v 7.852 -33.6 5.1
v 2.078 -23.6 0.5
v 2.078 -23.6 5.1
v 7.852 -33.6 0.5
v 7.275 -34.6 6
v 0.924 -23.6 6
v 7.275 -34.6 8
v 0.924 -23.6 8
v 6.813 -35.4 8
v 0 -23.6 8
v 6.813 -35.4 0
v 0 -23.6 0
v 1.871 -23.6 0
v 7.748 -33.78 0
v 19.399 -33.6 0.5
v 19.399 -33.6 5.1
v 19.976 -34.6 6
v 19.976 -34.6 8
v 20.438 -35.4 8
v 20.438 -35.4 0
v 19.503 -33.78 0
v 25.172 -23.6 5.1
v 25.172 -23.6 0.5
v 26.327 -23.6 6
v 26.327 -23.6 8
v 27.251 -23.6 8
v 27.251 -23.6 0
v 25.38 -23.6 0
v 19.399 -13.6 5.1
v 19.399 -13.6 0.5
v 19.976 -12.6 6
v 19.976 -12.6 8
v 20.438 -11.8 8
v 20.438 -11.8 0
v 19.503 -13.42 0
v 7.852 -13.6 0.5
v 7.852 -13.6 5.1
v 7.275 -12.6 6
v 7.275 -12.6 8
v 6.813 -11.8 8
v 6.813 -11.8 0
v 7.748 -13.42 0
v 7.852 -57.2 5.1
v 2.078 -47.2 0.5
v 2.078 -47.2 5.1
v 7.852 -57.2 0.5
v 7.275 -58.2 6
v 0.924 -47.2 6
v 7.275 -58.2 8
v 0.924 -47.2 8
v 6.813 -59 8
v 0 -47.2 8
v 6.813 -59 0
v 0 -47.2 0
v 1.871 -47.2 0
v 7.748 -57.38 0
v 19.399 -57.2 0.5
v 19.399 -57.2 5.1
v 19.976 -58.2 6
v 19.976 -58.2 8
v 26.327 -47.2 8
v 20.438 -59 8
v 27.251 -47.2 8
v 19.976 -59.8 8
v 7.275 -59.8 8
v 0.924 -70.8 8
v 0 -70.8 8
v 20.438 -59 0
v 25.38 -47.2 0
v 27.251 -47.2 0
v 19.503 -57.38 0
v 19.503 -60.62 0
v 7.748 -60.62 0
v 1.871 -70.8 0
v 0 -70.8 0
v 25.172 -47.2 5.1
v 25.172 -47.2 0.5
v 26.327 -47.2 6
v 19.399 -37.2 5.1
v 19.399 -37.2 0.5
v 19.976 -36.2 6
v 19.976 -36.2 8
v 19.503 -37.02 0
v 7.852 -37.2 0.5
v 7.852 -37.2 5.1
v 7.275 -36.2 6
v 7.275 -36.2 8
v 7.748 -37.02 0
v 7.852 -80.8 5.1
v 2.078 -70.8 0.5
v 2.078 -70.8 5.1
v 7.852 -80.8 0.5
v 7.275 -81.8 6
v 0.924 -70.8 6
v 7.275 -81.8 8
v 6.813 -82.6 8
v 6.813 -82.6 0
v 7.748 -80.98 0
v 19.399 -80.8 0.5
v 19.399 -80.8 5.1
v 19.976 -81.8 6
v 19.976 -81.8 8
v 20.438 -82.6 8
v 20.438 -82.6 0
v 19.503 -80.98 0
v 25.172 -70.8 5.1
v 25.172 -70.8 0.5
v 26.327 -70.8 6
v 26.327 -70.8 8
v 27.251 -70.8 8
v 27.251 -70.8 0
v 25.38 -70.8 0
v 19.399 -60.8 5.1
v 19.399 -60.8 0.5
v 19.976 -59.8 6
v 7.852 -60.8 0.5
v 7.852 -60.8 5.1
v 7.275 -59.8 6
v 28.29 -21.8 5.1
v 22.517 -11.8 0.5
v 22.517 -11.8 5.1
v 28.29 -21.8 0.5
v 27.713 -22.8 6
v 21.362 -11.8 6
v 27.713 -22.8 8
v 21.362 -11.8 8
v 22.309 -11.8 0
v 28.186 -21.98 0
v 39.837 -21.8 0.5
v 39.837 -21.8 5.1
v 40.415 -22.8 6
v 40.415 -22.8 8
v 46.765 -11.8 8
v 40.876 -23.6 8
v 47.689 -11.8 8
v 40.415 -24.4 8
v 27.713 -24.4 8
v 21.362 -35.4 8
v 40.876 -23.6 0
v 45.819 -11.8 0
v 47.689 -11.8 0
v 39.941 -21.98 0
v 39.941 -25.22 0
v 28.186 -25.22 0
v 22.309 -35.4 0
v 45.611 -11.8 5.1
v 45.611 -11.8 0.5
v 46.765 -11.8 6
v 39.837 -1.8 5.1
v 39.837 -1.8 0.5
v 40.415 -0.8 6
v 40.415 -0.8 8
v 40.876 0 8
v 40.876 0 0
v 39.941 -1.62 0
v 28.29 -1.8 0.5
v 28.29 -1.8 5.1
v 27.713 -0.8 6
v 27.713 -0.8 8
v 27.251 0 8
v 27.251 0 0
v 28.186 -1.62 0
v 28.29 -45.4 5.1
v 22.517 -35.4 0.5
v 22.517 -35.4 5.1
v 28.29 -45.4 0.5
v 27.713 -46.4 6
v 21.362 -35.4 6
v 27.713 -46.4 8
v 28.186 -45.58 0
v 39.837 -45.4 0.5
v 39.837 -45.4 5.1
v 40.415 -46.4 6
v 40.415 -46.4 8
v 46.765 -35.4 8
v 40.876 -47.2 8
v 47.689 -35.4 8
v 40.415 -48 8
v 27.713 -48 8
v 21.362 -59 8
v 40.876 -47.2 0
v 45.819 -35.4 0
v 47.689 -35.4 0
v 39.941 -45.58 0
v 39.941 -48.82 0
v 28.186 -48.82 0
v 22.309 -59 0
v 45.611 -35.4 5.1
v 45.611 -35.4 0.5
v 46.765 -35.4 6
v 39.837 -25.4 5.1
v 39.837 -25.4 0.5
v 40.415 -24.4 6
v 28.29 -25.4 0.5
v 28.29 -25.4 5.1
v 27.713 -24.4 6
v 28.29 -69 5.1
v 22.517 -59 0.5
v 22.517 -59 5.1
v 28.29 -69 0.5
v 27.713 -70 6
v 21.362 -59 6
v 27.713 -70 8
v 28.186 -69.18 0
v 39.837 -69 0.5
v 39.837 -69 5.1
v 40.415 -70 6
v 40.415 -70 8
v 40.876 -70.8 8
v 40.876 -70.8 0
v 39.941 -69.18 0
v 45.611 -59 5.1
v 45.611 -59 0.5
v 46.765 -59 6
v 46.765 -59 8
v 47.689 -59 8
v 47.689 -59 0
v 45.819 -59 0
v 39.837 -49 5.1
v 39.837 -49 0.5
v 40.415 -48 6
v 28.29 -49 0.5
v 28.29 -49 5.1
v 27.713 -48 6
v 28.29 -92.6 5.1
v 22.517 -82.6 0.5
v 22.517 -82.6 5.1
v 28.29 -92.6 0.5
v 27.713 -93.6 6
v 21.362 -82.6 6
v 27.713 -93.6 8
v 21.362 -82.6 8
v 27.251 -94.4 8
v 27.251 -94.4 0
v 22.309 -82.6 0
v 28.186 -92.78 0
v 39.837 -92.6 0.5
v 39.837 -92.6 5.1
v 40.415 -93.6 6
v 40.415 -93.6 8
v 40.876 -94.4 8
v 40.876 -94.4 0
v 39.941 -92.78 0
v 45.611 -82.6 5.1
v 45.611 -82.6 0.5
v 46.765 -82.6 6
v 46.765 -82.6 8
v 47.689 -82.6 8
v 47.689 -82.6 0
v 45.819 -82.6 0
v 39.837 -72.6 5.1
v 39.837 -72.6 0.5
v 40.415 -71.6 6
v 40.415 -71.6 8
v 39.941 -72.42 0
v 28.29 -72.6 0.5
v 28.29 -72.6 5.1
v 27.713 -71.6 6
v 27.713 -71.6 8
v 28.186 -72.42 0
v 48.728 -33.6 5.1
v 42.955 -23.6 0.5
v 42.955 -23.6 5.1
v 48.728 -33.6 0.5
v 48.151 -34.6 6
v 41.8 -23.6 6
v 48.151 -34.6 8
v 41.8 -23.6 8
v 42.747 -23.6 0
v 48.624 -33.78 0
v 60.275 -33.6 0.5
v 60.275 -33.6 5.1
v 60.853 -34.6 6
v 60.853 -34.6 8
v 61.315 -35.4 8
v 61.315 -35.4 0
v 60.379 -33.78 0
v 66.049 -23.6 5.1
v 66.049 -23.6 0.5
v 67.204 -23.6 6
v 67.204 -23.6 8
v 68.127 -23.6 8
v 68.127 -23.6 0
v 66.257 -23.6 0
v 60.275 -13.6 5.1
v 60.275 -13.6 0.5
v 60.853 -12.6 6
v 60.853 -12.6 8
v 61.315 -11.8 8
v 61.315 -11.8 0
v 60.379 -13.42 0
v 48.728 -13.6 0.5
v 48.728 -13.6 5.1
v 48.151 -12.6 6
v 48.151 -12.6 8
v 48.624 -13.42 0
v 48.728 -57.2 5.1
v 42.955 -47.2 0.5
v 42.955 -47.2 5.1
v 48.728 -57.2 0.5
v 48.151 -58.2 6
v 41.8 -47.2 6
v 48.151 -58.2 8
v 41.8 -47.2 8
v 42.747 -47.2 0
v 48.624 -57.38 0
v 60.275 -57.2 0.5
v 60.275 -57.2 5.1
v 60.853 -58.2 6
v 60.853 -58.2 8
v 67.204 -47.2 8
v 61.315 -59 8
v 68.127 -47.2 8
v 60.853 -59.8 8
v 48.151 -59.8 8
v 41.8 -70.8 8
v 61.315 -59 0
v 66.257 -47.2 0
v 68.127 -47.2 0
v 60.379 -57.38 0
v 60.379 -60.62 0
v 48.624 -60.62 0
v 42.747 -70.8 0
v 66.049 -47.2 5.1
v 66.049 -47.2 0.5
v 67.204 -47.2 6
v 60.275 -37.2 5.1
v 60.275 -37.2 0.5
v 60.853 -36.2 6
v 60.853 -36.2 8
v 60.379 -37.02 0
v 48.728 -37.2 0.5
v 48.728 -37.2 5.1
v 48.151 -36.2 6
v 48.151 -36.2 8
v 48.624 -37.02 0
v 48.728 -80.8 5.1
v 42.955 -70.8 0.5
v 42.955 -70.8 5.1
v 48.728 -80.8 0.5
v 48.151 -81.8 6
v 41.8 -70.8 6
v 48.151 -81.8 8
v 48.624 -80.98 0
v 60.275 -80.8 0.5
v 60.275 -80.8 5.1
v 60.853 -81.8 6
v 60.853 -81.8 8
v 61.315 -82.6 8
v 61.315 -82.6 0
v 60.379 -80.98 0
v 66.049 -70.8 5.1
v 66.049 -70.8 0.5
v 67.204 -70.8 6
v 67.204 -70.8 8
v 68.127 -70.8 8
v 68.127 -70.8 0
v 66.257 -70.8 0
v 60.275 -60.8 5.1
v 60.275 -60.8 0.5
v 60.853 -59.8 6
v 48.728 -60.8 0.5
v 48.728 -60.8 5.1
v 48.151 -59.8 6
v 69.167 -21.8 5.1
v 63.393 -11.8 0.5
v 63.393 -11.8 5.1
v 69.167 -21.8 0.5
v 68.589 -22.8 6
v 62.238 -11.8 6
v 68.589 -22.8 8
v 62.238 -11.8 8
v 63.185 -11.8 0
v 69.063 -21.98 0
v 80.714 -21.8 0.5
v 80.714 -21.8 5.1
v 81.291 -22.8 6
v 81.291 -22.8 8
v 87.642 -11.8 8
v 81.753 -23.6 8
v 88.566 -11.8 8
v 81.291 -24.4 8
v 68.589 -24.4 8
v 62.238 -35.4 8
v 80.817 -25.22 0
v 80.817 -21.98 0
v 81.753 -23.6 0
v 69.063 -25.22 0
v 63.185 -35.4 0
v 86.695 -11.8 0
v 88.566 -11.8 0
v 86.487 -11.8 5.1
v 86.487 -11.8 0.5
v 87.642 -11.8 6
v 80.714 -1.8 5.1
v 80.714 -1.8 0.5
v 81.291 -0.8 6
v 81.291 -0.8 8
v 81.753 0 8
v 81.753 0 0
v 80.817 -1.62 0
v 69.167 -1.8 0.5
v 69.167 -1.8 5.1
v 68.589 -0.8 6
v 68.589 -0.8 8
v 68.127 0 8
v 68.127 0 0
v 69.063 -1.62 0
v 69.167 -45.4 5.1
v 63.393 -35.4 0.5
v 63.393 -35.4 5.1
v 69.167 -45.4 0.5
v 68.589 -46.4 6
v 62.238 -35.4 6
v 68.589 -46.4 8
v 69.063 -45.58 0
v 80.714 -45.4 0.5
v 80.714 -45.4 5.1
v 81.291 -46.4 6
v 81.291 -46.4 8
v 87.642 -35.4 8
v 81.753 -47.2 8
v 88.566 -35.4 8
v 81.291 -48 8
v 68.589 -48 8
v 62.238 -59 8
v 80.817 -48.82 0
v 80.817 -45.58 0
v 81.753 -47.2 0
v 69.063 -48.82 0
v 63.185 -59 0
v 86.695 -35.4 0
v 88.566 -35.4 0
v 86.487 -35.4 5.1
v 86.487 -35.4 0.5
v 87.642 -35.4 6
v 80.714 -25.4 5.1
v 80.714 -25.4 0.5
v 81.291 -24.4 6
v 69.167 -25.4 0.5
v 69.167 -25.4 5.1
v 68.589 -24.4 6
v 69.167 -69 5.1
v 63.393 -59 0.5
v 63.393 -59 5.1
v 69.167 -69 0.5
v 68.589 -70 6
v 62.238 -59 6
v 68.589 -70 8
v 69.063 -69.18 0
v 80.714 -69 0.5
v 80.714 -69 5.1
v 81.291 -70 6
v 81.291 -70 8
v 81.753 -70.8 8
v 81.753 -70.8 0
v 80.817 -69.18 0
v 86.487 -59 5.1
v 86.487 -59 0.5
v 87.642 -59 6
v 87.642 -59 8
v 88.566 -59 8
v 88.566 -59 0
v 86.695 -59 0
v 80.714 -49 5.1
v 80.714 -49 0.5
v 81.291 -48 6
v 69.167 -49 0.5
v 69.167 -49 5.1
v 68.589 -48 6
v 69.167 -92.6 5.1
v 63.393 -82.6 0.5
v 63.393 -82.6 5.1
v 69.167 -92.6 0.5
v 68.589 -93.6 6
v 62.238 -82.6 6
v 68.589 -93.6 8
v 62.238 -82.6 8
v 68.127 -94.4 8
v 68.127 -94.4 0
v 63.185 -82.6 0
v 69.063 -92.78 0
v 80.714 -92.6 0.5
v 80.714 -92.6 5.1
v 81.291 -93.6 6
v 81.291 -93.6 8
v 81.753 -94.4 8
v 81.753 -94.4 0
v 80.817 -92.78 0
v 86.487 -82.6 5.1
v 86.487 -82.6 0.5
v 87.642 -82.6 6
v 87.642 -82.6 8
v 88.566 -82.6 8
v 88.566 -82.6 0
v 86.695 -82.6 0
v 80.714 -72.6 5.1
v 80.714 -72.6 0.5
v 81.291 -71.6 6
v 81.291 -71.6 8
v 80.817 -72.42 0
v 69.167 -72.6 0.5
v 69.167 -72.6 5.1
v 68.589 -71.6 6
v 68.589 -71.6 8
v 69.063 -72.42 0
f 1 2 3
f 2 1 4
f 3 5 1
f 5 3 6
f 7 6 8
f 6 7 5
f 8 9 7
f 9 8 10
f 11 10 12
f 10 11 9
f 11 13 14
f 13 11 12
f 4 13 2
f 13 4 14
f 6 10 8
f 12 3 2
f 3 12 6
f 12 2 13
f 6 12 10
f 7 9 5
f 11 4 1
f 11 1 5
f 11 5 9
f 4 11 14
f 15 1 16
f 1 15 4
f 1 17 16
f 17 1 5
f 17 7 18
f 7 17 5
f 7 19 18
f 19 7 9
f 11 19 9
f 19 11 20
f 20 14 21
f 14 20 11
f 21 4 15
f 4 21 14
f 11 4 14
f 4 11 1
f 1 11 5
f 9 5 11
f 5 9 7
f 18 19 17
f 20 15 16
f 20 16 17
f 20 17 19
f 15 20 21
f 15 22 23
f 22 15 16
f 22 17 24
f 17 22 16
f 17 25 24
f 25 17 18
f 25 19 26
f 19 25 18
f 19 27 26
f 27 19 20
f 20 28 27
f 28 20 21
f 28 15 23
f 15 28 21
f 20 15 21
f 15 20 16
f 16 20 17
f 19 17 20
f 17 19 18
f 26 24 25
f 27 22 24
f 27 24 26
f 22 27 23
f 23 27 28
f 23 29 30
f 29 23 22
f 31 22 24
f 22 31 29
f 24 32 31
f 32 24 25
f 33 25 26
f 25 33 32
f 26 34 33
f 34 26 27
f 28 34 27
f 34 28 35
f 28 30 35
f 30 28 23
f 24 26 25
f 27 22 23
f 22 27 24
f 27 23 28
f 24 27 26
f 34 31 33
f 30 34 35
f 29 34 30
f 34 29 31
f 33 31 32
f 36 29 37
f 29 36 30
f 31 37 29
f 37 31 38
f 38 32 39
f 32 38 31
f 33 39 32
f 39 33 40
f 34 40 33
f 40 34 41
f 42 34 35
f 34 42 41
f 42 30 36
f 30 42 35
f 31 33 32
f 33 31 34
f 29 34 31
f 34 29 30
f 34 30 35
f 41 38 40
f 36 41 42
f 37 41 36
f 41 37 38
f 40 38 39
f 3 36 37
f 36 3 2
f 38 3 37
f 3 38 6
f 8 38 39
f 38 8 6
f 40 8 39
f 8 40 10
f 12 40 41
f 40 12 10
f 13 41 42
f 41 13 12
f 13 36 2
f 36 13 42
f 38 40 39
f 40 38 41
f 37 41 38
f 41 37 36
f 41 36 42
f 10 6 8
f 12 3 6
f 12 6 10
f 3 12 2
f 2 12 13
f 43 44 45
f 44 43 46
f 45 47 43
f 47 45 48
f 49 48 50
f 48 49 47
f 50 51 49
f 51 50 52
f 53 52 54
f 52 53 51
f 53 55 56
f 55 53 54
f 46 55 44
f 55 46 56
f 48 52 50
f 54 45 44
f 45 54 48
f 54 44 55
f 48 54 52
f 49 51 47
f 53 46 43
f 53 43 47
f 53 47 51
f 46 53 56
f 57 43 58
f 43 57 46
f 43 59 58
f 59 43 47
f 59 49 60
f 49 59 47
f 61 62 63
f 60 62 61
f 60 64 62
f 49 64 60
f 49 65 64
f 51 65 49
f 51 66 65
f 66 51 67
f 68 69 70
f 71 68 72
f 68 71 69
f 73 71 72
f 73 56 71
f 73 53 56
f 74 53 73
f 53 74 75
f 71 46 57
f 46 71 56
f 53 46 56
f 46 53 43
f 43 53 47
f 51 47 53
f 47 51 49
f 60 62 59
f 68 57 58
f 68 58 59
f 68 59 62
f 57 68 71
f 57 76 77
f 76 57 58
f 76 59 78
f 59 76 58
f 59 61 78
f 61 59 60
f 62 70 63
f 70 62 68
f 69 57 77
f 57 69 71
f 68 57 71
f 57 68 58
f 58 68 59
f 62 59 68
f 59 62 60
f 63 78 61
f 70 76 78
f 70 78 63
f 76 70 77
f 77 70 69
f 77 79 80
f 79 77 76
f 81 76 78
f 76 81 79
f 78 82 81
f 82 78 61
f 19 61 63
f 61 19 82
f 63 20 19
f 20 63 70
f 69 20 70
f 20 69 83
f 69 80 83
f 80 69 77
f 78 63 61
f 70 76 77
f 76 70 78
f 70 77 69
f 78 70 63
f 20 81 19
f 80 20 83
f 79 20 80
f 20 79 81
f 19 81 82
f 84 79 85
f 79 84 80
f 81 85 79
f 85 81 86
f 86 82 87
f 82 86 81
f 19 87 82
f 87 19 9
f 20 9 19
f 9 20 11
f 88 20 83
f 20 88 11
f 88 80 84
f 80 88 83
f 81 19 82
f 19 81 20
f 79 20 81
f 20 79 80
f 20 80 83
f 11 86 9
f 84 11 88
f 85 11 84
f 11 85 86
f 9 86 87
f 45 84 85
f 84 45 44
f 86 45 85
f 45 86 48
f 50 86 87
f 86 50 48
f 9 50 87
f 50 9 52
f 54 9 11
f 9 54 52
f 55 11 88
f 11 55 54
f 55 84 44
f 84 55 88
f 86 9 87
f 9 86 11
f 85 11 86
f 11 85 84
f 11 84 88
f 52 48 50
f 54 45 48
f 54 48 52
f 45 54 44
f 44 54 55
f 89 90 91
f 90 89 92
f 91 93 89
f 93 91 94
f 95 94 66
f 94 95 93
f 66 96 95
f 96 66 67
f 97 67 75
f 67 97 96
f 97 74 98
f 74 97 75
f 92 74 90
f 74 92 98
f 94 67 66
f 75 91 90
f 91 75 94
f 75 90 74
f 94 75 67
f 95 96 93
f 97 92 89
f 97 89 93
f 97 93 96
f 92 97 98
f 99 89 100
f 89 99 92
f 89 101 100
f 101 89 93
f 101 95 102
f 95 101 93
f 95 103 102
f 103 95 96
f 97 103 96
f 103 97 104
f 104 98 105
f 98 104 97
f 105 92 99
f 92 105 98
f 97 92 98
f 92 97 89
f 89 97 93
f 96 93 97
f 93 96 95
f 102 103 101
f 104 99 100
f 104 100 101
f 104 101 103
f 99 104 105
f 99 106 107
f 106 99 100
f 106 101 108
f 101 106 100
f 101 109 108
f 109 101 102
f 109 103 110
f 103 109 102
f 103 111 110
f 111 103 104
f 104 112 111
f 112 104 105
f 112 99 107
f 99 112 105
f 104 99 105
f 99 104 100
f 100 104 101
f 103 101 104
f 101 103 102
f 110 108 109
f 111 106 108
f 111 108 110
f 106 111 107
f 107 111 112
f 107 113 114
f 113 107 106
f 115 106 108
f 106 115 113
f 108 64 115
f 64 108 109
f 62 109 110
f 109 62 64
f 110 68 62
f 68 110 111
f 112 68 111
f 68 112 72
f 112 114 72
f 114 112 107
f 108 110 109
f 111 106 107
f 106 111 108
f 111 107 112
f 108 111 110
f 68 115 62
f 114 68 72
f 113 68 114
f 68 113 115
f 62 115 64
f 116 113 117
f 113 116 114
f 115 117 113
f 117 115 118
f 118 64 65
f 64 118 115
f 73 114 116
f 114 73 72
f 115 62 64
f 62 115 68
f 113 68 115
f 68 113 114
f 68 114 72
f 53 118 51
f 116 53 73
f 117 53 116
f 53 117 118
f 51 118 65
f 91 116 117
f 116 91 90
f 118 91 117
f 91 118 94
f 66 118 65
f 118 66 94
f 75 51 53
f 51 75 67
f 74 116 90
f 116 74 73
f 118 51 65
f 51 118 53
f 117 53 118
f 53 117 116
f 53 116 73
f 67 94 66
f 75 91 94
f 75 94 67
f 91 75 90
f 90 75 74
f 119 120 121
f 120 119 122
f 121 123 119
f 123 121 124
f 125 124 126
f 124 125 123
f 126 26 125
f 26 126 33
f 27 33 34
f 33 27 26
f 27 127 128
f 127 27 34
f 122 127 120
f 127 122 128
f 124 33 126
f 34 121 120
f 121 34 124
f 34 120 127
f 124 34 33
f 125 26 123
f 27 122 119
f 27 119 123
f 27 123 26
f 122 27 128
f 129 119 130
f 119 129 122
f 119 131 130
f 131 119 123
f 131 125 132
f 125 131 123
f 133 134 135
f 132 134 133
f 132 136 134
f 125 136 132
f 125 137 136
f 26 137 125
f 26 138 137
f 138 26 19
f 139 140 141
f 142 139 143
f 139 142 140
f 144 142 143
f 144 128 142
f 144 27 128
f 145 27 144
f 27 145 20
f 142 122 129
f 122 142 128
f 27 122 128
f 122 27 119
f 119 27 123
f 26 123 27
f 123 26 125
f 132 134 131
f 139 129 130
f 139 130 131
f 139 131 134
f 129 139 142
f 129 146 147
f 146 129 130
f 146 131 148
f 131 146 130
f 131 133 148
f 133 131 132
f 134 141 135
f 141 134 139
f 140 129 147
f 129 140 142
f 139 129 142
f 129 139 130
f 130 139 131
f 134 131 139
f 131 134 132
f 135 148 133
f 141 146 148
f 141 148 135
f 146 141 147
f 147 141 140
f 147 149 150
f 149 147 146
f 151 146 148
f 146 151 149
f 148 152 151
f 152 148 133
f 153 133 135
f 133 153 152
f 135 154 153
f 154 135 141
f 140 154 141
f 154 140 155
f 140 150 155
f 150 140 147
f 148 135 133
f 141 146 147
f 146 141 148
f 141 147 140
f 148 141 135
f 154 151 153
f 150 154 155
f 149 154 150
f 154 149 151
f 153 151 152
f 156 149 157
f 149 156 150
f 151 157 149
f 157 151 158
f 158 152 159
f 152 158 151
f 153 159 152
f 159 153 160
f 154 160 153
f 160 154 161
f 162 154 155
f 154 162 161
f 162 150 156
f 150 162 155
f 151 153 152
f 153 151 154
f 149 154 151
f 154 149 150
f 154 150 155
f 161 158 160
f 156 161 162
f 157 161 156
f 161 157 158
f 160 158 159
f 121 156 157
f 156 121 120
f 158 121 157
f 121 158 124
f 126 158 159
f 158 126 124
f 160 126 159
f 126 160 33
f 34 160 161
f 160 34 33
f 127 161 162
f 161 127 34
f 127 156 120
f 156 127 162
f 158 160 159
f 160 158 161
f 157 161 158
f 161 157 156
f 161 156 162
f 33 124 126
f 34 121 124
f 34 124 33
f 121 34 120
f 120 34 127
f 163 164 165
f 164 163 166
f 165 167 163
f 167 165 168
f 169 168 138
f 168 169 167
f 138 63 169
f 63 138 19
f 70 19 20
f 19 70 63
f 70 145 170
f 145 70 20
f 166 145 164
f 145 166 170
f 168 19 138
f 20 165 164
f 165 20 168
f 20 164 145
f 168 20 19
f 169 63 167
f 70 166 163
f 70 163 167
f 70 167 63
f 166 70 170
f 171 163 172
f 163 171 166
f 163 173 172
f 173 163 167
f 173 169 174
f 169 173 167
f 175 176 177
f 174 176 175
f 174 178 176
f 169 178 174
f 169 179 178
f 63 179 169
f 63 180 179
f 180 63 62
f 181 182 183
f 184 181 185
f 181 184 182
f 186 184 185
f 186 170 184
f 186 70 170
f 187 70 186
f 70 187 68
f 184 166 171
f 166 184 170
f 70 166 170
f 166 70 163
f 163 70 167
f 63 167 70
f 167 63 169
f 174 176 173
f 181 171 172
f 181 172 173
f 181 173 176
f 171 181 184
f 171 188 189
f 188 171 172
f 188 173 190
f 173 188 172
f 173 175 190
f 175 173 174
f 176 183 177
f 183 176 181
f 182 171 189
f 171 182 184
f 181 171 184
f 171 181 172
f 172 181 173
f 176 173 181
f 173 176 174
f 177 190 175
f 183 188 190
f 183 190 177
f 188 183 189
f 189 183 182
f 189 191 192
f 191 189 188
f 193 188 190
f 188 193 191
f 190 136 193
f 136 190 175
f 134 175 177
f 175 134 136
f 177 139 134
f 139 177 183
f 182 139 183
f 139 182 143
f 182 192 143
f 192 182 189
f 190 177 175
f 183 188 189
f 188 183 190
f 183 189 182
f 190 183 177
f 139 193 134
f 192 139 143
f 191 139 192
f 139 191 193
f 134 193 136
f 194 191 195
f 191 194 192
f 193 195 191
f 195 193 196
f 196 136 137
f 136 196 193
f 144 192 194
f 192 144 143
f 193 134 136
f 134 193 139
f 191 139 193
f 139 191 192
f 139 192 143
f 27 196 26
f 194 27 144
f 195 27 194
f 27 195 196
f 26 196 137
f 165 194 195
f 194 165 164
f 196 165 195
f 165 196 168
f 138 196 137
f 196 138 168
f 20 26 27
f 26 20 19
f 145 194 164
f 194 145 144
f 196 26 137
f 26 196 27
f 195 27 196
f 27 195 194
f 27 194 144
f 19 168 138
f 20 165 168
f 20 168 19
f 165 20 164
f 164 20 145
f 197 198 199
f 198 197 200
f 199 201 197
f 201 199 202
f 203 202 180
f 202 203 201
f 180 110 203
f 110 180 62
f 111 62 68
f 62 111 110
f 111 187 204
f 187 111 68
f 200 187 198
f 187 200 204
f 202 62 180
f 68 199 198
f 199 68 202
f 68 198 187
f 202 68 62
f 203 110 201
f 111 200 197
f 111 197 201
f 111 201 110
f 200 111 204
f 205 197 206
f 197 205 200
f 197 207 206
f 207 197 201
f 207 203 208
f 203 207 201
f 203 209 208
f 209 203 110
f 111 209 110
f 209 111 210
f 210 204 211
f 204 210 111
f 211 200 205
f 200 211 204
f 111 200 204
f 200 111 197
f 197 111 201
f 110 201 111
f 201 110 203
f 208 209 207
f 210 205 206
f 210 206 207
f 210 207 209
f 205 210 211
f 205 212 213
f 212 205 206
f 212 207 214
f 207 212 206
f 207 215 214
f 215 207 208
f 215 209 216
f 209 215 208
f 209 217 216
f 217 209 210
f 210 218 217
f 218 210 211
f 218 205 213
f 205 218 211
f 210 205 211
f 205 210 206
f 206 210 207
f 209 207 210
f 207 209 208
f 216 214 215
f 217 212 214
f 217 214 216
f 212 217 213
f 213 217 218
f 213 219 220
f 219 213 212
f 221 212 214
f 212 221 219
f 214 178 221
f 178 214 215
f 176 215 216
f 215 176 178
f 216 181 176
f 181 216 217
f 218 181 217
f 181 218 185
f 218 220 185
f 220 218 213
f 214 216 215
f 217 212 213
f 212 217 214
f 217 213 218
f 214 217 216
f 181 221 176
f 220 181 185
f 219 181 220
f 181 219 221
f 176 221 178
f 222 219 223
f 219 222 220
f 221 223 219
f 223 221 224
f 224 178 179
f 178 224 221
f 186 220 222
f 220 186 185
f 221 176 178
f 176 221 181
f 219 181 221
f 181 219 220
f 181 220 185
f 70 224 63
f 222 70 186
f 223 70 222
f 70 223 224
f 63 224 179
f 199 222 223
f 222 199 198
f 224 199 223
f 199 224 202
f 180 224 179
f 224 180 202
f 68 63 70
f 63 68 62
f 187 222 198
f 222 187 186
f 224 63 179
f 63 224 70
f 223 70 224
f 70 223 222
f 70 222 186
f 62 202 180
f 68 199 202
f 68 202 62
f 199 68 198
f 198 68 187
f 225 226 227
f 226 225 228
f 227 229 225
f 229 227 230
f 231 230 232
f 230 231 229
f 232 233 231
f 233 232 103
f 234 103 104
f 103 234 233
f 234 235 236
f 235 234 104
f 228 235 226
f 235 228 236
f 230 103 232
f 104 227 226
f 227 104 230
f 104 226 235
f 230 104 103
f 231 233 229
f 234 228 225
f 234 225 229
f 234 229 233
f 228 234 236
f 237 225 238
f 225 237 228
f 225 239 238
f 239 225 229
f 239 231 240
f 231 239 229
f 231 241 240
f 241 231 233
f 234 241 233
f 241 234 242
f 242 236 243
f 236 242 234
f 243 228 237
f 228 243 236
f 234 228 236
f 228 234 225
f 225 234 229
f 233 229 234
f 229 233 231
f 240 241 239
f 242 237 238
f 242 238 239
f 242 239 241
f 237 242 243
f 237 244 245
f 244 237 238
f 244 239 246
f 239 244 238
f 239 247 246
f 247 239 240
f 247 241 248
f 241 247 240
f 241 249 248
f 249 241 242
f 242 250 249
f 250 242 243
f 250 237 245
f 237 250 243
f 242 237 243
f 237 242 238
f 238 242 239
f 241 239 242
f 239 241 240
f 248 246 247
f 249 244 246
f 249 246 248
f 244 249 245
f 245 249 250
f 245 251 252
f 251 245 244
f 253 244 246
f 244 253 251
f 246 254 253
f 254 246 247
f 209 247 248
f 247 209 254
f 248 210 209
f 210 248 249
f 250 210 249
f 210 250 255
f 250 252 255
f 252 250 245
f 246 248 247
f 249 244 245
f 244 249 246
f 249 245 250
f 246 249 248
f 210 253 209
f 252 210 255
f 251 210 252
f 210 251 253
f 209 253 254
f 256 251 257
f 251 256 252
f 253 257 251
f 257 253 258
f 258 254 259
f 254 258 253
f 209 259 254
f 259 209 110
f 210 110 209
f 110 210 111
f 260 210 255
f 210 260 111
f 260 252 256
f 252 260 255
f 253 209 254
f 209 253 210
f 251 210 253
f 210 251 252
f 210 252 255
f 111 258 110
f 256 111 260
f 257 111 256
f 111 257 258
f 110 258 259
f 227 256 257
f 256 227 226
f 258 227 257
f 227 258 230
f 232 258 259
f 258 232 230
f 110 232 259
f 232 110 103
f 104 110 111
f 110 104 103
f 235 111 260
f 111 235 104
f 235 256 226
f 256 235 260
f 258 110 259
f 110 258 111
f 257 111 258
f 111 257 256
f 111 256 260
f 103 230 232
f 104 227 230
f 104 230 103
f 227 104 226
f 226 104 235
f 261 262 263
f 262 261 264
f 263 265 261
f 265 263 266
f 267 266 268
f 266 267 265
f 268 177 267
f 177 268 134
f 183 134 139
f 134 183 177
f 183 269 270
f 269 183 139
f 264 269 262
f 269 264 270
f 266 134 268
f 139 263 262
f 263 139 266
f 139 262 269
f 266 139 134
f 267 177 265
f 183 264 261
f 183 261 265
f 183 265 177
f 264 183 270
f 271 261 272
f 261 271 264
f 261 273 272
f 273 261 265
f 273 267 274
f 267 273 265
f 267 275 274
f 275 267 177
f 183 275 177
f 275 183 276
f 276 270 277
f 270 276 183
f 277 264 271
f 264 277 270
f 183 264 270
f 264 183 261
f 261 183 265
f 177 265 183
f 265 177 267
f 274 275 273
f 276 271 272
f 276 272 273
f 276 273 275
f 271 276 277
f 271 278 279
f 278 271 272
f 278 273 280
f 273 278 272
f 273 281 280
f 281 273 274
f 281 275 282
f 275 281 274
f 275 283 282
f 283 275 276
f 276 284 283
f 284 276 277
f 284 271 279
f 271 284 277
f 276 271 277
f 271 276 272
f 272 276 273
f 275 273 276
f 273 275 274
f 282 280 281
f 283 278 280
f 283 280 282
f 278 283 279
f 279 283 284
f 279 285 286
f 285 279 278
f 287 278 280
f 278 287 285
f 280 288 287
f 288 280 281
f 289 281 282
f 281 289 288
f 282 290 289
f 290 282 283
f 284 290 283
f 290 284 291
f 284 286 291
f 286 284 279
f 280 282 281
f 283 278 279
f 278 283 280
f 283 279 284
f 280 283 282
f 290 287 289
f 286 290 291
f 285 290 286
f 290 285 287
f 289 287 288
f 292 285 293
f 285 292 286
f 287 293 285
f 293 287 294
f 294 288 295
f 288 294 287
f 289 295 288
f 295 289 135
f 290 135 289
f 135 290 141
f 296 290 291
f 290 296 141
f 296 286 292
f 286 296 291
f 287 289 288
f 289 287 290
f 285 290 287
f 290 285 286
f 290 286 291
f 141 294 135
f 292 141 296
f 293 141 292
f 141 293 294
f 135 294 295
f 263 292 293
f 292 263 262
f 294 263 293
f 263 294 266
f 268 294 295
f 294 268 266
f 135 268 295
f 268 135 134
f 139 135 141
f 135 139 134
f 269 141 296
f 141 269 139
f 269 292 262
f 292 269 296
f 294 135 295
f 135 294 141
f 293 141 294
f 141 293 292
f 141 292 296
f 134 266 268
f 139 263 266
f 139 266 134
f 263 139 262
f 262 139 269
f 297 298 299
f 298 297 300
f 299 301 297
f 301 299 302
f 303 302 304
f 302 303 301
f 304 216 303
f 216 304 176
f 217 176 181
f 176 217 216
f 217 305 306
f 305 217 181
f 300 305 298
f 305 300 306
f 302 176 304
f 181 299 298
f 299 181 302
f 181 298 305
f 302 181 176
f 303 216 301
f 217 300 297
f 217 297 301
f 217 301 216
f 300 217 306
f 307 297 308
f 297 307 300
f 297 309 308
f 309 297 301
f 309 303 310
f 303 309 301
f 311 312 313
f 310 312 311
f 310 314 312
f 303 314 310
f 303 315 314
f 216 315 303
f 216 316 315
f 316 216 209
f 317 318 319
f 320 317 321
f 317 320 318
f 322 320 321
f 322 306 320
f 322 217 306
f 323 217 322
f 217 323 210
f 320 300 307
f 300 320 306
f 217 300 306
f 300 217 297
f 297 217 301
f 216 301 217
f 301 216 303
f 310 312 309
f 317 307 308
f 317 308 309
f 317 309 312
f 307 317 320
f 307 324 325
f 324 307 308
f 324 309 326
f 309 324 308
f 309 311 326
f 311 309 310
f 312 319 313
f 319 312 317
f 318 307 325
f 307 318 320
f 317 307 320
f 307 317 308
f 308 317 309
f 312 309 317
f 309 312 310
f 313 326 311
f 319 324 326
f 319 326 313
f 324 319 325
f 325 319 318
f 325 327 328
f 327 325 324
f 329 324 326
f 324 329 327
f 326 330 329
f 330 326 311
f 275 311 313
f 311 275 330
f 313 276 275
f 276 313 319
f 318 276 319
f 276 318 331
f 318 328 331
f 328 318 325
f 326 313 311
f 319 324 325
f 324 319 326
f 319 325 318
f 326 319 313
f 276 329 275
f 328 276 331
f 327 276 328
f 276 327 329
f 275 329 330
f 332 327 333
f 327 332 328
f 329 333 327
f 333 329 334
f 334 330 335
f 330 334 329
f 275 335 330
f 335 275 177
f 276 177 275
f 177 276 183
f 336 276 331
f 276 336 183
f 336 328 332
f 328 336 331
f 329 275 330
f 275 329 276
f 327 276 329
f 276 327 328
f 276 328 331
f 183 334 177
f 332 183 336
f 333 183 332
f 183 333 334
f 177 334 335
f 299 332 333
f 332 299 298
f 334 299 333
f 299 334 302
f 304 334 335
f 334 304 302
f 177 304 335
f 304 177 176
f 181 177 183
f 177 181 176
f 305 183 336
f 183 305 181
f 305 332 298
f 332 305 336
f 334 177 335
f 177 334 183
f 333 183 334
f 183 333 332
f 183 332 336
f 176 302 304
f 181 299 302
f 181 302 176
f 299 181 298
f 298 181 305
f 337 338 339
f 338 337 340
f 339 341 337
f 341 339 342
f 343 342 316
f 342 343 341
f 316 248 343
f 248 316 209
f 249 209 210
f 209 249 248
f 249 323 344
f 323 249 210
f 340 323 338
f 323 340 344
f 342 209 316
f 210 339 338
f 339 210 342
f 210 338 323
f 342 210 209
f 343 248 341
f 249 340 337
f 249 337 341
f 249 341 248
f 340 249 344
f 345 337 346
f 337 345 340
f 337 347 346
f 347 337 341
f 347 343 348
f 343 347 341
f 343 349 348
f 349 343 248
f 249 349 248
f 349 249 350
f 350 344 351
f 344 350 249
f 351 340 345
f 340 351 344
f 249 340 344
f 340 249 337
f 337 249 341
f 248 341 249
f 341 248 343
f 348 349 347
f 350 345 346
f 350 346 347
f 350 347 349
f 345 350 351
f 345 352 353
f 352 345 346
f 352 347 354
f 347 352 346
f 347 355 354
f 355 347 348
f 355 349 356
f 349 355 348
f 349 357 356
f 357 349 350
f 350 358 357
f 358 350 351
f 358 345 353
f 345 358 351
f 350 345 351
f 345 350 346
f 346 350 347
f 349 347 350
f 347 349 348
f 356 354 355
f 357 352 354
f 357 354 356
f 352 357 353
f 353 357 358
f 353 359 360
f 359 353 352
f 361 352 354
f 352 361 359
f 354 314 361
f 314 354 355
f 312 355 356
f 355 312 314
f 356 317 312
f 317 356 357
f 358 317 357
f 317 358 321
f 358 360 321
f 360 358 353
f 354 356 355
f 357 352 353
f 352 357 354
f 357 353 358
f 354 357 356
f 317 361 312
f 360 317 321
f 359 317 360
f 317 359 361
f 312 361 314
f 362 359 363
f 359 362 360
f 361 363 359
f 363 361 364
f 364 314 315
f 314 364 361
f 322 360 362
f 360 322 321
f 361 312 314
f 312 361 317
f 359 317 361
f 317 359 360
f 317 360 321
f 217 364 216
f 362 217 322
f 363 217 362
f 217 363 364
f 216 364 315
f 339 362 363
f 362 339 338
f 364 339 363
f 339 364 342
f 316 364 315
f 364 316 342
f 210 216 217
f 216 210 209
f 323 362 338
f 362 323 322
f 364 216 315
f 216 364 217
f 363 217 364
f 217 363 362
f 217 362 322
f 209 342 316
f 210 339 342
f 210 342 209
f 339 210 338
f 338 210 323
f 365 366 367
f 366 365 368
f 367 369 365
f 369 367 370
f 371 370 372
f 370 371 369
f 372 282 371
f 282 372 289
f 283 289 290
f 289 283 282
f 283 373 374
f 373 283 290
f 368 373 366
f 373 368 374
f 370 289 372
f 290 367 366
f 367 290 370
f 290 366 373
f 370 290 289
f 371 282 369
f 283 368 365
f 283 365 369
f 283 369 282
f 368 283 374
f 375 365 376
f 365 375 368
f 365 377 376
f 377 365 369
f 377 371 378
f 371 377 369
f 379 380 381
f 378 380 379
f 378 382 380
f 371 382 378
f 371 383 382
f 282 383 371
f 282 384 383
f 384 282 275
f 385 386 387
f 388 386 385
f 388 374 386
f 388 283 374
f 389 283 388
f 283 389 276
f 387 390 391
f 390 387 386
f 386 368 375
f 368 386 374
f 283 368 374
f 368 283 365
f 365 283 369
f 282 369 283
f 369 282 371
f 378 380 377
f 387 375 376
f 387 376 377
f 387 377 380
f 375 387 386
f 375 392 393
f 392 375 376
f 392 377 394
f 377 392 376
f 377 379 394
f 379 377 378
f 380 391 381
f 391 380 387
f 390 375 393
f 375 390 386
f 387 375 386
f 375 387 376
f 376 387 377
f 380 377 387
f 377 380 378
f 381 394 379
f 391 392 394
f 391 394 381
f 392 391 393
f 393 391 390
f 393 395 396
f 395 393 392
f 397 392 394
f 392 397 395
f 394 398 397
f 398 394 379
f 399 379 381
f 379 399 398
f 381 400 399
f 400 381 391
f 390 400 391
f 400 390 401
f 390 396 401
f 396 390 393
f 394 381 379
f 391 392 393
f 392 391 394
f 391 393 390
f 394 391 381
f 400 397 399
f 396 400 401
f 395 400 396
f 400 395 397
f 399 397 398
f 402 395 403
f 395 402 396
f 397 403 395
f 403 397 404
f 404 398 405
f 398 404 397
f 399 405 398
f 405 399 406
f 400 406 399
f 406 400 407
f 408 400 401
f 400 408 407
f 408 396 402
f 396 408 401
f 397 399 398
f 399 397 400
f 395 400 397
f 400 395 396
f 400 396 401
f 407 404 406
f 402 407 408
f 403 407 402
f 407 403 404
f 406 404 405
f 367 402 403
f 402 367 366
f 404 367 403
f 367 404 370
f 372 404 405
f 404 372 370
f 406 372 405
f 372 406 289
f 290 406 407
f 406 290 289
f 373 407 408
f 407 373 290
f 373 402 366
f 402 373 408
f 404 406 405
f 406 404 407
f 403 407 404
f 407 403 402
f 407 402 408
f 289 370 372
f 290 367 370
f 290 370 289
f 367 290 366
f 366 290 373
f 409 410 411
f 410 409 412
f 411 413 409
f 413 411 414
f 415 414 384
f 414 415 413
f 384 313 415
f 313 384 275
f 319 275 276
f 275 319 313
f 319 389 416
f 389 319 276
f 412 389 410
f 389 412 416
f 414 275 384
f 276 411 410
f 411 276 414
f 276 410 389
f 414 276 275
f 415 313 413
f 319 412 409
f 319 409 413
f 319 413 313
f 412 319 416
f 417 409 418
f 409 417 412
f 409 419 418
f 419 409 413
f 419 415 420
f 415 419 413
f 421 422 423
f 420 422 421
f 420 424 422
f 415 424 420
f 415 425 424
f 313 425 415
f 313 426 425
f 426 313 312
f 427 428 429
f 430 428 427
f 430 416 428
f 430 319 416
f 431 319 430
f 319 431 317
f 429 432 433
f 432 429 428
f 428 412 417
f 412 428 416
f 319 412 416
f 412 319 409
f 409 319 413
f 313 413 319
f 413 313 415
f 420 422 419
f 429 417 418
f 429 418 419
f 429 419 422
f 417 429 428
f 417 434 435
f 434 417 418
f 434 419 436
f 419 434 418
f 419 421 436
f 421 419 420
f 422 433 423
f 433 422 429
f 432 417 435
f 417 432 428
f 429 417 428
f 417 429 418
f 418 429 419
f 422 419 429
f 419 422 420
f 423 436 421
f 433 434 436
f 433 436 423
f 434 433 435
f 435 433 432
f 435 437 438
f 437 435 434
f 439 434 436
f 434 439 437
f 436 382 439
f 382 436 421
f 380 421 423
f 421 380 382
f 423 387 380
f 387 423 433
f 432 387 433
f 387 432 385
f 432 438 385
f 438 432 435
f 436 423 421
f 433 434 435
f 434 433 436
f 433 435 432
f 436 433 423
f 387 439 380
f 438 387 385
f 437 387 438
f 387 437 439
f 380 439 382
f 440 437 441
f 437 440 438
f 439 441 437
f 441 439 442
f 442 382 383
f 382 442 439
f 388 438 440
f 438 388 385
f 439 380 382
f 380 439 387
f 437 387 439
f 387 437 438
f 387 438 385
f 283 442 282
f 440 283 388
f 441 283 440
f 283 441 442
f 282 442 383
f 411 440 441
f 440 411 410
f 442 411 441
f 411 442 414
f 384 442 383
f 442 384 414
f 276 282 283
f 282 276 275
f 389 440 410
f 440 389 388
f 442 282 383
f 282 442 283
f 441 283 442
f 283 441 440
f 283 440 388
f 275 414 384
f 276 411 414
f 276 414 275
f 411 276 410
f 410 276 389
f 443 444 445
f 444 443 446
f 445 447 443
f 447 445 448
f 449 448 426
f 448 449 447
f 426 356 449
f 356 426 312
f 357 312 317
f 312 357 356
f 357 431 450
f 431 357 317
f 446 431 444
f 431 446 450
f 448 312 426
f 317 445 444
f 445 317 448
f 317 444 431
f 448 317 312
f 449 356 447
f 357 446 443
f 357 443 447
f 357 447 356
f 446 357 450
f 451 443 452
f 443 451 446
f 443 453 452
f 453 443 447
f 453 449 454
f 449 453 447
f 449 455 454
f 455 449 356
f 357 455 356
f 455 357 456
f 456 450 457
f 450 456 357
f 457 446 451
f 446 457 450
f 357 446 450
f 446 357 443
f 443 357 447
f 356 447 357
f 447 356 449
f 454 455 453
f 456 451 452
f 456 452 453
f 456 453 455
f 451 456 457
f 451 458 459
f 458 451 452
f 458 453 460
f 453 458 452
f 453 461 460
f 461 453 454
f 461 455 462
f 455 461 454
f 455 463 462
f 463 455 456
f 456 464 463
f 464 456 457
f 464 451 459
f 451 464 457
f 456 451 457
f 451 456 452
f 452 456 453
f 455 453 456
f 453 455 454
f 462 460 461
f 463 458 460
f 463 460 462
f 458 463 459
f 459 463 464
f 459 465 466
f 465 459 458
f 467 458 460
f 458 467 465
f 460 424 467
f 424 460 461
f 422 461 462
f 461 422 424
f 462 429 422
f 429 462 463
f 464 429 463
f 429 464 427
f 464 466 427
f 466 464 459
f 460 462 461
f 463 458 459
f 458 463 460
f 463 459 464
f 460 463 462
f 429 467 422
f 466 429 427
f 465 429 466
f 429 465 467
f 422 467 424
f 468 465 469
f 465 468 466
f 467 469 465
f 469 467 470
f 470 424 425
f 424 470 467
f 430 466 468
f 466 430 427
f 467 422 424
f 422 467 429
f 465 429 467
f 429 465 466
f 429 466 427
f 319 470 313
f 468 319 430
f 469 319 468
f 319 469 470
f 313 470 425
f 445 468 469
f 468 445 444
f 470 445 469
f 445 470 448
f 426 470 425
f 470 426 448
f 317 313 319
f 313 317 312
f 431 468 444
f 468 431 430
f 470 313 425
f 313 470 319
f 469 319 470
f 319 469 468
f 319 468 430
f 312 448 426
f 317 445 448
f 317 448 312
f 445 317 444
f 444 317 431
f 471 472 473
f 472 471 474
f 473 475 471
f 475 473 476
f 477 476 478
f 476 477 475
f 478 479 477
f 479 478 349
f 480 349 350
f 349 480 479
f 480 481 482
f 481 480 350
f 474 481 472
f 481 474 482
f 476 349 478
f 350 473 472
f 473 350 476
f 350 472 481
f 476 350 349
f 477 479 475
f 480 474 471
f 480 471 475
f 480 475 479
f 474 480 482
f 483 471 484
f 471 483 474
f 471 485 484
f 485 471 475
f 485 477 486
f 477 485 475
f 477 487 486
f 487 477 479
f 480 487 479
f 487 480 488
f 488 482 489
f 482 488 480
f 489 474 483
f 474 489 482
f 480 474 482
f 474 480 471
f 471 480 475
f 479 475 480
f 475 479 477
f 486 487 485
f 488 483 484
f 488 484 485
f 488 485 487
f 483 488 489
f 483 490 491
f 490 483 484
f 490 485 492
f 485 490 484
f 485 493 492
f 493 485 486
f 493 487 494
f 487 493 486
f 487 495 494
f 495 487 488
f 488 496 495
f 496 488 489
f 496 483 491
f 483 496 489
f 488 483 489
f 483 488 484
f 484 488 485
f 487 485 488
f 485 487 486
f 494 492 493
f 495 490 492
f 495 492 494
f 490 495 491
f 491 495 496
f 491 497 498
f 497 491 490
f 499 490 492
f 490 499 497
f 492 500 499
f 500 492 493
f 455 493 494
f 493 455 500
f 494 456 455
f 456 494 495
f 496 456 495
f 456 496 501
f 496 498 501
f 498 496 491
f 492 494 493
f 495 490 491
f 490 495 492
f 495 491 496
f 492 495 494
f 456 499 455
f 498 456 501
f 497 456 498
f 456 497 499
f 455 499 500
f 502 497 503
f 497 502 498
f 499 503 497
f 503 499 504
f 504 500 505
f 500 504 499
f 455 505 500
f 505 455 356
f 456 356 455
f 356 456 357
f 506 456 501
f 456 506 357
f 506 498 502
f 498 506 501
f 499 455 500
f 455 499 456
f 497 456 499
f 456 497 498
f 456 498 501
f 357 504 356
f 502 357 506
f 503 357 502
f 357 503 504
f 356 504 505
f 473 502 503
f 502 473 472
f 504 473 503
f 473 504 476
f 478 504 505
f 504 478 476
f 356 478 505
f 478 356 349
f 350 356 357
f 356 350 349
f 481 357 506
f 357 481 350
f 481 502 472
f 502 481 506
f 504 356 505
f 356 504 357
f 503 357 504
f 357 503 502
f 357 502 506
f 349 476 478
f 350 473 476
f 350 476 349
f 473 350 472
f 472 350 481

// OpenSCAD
/*[ Hex unit size ]*/

//Depth of the grid
depth = 8;
//Width of the hexagon's hole (flat side to flat side)
hole_width = 20;
//Thickness of the wall forming each hexagon
wall_thickness = 1.8;

/*[ Grid size settings ]*/
max_grid_width=100;
max_grid_height=100;

/*[ Grid shape ]*/
//If checked, ignores custom column sizes and fills grid to maximum size.
fill=true;;
flip_staggering=true;
//Amount of hexagons per column. Each entry defines a one column, where the number specifies the amount of hex units that will be generated for the respective column. (Ignored if "fill" is checked)
columns=[3,5,8,6,4,3,4,5,6];
include_offsets=false;
//Optional: Offset for each column. This will ignore grid size limits.
column_offsets=[0,-2,-3,-1,0,2,4];
include_gaps=false;
//Optional: Gaps for each column. *NOTE: Change these values in the code. Seems like 2D vector parameters aren't supported by the parameter editor and are always overwritten by the defaults.
column_gaps=[[9, 9], [9, 9], [], [], [], [], [], [], []];

/*[ Flat edges ]*/
edge_left = false;
edge_top = false;
edge_right = false;
edge_bottom = false;


//Calculated global variables
//Hexagon dimensions
hex_inner_r = hole_width/sqrt(3); //Inner radius/side length (center to point)
hex_h=hole_width+wall_thickness*2; //Outer side to side distance
hex_s=hex_h/sqrt(3); //Outer radius/side length 
hex_d=2*hex_s; //Outer diameter (point to point)
hex_t=hex_s/2;
//Grid dimensions
max_grid_hexagons_x = fill? floor(max_grid_width/(hex_d-hex_t) +(edge_left?0.5:0) +(edge_right?0.5:0)): len(columns);
max_grid_hexagons_y = fill? floor(max_grid_height/hex_h +(edge_top?0.5:0) +(edge_bottom?0.5:0)): max(columns);
max_grid_hexagons_y_lo = fill? floor(max_grid_height/hex_h - 0.5 +(edge_top?0.5:0) +(edge_bottom?0.5:0)): (max(columns) - 0.5);
total_width = max_grid_hexagons_x * (hex_d-hex_t) + hex_t;
total_height = hex_h*max(max_grid_hexagons_y - 0.5, max_grid_hexagons_y_lo);


translate([edge_left?0:hex_s, edge_top?0:-hex_h/2, 0])
grid(columns, include_offsets?column_offsets:[], include_gaps?column_gaps:[], depth, hole_width, wall_thickness, fill);


module grid(cols, offsets, gaps, height, hole_width, wall_width, fill){    
    for(hcol = [0:fill?max_grid_hexagons_x-1:(len(cols)-1)]){
        for(hrow = [0:(fill?(max_grid_hexagons_y-1):(cols[hcol]-1))]) {
            skip = hcol<len(gaps) && len(search(hrow+1, gaps[hcol])) > 0;          
            if(!skip){
                offset_value=hcol>len(offsets)-1?0:offsets[hcol];
                
                lo = (hcol+(flip_staggering?1:0))%2;
                x = (hex_d-hex_t)*hcol;
                y = -(hex_h)*(hrow + offset_value + lo/2);                
                
                if(hcol<max_grid_hexagons_x && hrow<(lo==0?max_grid_hexagons_y:max_grid_hexagons_y_lo)){
                    left = edge_left && hcol==0;
                    top = edge_top && hrow==0 && hcol%2==(flip_staggering?1:0);
                    right = edge_right && hcol==max_grid_hexagons_x-1;
                    bottom = edge_bottom && hrow+1==(lo==0?max_grid_hexagons_y:max_grid_hexagons_y_lo) && -y+hex_h>total_height+0.001 && -y+hex_h/2<=total_height;
                    translate([x, y, 0]) halfhex(height, hex_s, wall_width, hole_width, left, top, right, bottom);
                }
            }        
        }
    }
}

module halfhex(height, radius, wall_thickness, hole_width, left, top, right, bottom){
    difference(){
        union(){
            hex(height, radius, wall_thickness, hole_width);
            if(left) translate([0, hex_h/2, 0]) wall(depth, wall_thickness, hex_h);
            if(top) translate([hex_d/2, 0, 0]) rotate([0,0,-90]) wall(depth, wall_thickness, hex_d);
            if(right) translate([0, -hex_h/2, 0]) rotate([0,0,180]) wall(depth, wall_thickness, hex_h);
            if(bottom) translate([-hex_d/2, 0, 0]) rotate([0,0,90]) wall(depth, wall_thickness, hex_d);
        }
        if(left) translate([-hex_d/2, -hex_h, 0]) cube([hex_d/2, 2*hex_h, depth]);
        if(top) translate([-hex_d/2, 0, 0]) cube([hex_d, hex_h, depth]);
        if(right) translate([0, -hex_h, 0]) cube([hex_d/2, 2*hex_h, depth]);
        if(bottom) translate([-hex_d/2, -hex_h, 0]) cube([hex_d, hex_h, depth]);
    }
}

module hex(height, radius, wall_thickness, hole_width){
    for(i=[0:5]){
        rotate([0,0,i*60+30])
        translate([-hole_width/2-wall_thickness, radius/2, 0])
        wall(height, wall_thickness, radius);
    }
}

module wall(height, wall_thickness, length){
    hmax=height;
    hmin=5.1;
    hd=2;
    tmax=wall_thickness;
    tmin=wall_thickness-1;   
    ft = 0.18;//fillet thickness
    fh = 0.5;//fillet height
    
    difference(){
        rotate([90,0,0])
            linear_extrude(length)   
            polygon([[0,0], [0,hmax], [tmin,hmax], [tmin,hmax-hd], [tmax,hmin], [tmax,fh], [tmax-ft,0]]);
        //Fillet
        rotate([0,0,-30])
            cube([4*tmax, 2*tmax, hmax]);
        mirror([0,1,0])
            translate([0,length,0])
            rotate([0,0,-30])
            cube([4*tmax, 2*tmax, hmax]);
    }
}
